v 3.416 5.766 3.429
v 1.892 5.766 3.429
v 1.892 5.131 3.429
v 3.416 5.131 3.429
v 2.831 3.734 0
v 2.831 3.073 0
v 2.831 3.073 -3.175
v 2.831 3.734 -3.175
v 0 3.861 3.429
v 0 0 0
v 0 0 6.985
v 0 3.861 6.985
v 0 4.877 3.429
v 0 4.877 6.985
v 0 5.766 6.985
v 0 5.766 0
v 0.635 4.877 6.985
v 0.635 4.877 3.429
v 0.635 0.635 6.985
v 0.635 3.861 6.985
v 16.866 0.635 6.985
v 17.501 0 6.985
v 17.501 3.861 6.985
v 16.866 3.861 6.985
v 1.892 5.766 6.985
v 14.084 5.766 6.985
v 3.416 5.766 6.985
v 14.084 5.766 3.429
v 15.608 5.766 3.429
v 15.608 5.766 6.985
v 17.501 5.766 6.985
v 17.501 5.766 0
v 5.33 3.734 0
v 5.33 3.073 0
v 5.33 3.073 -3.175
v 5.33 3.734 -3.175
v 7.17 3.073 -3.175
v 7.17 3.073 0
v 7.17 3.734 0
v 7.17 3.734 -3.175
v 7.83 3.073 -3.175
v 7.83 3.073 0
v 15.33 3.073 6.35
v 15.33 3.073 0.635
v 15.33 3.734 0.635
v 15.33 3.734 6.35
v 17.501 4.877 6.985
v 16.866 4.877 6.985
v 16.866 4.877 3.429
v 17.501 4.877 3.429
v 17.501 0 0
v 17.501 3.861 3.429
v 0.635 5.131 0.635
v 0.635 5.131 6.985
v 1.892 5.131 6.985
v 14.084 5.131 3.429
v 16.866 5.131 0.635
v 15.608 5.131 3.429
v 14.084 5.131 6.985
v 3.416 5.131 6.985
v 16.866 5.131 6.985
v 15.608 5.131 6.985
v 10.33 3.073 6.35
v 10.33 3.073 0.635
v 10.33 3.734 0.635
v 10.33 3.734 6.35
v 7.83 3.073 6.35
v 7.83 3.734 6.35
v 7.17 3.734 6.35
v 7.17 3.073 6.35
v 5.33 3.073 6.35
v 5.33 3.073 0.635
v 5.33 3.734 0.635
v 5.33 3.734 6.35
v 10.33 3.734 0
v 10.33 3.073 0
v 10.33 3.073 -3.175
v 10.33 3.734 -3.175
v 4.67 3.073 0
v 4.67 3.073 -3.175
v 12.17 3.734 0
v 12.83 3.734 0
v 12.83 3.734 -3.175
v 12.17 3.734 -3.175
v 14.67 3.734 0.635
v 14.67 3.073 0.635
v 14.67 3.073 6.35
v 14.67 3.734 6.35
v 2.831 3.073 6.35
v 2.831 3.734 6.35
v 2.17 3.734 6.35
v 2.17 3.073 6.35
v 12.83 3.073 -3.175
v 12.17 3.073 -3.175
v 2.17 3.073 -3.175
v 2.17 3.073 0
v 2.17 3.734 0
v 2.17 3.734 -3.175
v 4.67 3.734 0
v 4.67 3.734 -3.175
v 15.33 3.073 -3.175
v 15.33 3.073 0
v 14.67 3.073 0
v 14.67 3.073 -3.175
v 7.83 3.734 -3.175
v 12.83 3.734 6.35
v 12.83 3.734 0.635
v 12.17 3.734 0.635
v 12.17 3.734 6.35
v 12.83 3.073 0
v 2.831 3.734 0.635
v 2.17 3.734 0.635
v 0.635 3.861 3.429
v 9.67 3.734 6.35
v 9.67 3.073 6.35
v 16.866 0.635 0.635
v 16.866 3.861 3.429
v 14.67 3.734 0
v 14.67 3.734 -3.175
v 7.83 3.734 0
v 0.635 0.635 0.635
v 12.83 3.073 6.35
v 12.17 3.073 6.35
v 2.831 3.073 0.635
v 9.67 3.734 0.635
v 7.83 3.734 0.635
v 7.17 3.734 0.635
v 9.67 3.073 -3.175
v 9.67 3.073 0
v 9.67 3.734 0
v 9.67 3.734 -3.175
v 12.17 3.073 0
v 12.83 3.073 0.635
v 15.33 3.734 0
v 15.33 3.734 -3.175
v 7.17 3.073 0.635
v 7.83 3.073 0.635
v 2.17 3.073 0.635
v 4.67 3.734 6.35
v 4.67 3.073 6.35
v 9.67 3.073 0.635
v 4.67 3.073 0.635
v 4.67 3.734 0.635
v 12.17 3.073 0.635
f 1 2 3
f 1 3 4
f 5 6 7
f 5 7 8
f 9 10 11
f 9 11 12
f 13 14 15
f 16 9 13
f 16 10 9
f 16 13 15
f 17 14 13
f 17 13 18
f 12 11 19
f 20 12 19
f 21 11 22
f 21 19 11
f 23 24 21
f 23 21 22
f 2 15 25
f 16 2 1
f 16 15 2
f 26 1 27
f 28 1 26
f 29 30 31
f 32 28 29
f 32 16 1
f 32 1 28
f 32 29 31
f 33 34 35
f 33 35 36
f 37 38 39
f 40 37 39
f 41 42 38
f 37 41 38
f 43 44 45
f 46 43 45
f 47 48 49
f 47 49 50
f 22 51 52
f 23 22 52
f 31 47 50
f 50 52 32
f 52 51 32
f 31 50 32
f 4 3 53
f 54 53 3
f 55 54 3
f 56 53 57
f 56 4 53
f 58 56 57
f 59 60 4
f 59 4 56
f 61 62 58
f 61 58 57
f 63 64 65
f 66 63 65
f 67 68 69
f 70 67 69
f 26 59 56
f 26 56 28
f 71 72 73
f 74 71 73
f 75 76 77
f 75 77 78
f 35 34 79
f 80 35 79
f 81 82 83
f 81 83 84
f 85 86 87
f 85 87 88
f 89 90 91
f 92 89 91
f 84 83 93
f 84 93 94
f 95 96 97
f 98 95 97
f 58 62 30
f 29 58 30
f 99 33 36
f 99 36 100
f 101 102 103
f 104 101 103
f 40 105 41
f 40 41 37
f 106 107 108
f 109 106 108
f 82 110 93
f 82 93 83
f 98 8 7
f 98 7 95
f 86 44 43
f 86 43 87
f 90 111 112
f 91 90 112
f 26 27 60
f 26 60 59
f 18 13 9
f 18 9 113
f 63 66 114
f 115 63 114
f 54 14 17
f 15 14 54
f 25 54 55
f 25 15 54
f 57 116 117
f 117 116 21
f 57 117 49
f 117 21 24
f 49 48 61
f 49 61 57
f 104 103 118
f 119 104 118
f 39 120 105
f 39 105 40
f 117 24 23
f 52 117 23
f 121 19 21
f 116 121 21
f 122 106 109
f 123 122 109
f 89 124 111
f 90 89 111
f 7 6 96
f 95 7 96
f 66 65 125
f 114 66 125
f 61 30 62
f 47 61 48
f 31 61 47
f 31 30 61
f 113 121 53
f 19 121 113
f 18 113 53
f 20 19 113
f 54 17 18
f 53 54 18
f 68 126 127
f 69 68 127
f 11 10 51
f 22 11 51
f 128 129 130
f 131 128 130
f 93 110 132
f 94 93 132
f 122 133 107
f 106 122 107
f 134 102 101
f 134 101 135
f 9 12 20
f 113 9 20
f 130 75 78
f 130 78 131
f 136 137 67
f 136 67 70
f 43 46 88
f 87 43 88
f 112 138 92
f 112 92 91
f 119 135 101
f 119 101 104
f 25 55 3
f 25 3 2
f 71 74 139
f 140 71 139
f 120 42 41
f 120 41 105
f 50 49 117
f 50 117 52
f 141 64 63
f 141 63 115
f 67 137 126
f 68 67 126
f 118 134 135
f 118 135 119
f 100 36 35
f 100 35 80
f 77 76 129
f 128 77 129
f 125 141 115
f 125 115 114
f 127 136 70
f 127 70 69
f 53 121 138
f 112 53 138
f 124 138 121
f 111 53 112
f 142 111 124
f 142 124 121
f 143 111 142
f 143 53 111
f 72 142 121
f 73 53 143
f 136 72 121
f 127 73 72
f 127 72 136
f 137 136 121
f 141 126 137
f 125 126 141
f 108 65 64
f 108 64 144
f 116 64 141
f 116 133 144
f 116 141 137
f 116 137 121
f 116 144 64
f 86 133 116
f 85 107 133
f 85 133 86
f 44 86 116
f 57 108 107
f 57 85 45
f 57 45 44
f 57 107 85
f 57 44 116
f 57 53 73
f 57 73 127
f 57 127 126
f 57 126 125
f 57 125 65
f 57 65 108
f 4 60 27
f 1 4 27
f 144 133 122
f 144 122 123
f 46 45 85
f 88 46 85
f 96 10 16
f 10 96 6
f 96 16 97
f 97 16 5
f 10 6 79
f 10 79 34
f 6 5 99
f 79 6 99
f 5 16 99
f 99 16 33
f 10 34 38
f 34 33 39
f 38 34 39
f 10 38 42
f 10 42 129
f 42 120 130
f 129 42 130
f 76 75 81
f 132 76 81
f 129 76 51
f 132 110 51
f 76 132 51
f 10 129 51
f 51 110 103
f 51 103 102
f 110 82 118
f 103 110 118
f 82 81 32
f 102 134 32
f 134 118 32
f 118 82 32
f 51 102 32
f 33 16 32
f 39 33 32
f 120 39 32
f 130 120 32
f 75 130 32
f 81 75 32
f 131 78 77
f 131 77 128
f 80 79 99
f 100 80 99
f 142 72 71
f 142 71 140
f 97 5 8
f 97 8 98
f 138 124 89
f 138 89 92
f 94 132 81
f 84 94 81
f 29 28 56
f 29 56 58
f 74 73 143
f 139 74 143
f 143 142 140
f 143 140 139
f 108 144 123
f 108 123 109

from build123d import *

# Parameters (mm, degrees)
SKETCH1_W           = 17.5006
SKETCH1_H           = 5.7658
BOSS_EXTRUDE1_DEPTH = 6.985
SKETCH2_W           = 0.6604
SKETCH2_H           = 0.6604
BOSS_EXTRUDE2_DEPTH = 3.175
SKETCH4_W           = 16.2306
SKETCH4_H           = 4.4958
CUT_EXTRUDE1_DEPTH  = 6.35
SKETCH2_2_W         = 0.6604
SKETCH2_2_H         = 0.6604
BOSS_EXTRUDE3_DEPTH = 6.35
SKETCH5_W           = 0.635
SKETCH5_H           = 1.016
SKETCH5_W_2         = 1.524
SKETCH5_H_2         = 0.635
CUT_EXTRUDE2_DEPTH  = 3.556


with BuildPart() as part:
    # Sketch1 → Boss-Extrude1 (new body)
    with BuildSketch(Plane.XY):
        with Locations((8.7503, 2.8829)):
            Rectangle(SKETCH1_W, SKETCH1_H)
    extrude(amount=BOSS_EXTRUDE1_DEPTH)

    # Sketch2 → Boss-Extrude2 (add)
    with BuildSketch(Plane(origin=(0, 0, 0), x_dir=(-1, 0, 0), z_dir=(0, 0, -1))):
        with Locations((-12.5003, 3.4036)):
            Rectangle(SKETCH2_W, SKETCH2_H)
        with Locations((-10.0003, 3.4036)):
            Rectangle(SKETCH2_W, SKETCH2_H)
        with Locations((-7.5003, 3.4036)):
            Rectangle(SKETCH2_W, SKETCH2_H)
        with Locations((-5.0003, 3.4036)):
            Rectangle(SKETCH2_W, SKETCH2_H)
        with Locations((-15.0003, 3.4036)):
            Rectangle(SKETCH2_W, SKETCH2_H)
        with Locations((-2.5003, 3.4036)):
            Rectangle(SKETCH2_W, SKETCH2_H)
    extrude(amount=BOSS_EXTRUDE2_DEPTH)

    # Sketch4 → Cut-Extrude1 (cut)
    with BuildSketch(Plane.XY.offset(6.985)):
        with Locations((8.7503, 2.8829)):
            Rectangle(SKETCH4_W, SKETCH4_H)
    extrude(amount=-CUT_EXTRUDE1_DEPTH, mode=Mode.SUBTRACT)

    # Sketch2<2> → Boss-Extrude3 (add)
    with BuildSketch(Plane(origin=(0, 0, 0), x_dir=(-1, 0, 0), z_dir=(0, 0, -1))):
        with Locations((-12.5003, 3.4036)):
            Rectangle(SKETCH2_2_W, SKETCH2_2_H)
        with Locations((-10.0003, 3.4036)):
            Rectangle(SKETCH2_2_W, SKETCH2_2_H)
        with Locations((-7.5003, 3.4036)):
            Rectangle(SKETCH2_2_W, SKETCH2_2_H)
        with Locations((-5.0003, 3.4036)):
            Rectangle(SKETCH2_2_W, SKETCH2_2_H)
        with Locations((-15.0003, 3.4036)):
            Rectangle(SKETCH2_2_W, SKETCH2_2_H)
        with Locations((-2.5003, 3.4036)):
            Rectangle(SKETCH2_2_W, SKETCH2_2_H)
    extrude(amount=-BOSS_EXTRUDE3_DEPTH)

    # Sketch5 → Cut-Extrude2 (cut)
    with BuildSketch(Plane.XY.offset(6.985)):
        with Locations((0.3175, 4.3688)):
            Rectangle(SKETCH5_W, SKETCH5_H)
        with Locations((17.1831, 4.3688)):
            Rectangle(SKETCH5_W, SKETCH5_H)
        with Locations((14.8463, 5.4483)):
            Rectangle(SKETCH5_W_2, SKETCH5_H_2)
        with Locations((2.6543, 5.4483)):
            Rectangle(SKETCH5_W_2, SKETCH5_H_2)
    extrude(amount=-CUT_EXTRUDE2_DEPTH, mode=Mode.SUBTRACT)


solid = part.part
